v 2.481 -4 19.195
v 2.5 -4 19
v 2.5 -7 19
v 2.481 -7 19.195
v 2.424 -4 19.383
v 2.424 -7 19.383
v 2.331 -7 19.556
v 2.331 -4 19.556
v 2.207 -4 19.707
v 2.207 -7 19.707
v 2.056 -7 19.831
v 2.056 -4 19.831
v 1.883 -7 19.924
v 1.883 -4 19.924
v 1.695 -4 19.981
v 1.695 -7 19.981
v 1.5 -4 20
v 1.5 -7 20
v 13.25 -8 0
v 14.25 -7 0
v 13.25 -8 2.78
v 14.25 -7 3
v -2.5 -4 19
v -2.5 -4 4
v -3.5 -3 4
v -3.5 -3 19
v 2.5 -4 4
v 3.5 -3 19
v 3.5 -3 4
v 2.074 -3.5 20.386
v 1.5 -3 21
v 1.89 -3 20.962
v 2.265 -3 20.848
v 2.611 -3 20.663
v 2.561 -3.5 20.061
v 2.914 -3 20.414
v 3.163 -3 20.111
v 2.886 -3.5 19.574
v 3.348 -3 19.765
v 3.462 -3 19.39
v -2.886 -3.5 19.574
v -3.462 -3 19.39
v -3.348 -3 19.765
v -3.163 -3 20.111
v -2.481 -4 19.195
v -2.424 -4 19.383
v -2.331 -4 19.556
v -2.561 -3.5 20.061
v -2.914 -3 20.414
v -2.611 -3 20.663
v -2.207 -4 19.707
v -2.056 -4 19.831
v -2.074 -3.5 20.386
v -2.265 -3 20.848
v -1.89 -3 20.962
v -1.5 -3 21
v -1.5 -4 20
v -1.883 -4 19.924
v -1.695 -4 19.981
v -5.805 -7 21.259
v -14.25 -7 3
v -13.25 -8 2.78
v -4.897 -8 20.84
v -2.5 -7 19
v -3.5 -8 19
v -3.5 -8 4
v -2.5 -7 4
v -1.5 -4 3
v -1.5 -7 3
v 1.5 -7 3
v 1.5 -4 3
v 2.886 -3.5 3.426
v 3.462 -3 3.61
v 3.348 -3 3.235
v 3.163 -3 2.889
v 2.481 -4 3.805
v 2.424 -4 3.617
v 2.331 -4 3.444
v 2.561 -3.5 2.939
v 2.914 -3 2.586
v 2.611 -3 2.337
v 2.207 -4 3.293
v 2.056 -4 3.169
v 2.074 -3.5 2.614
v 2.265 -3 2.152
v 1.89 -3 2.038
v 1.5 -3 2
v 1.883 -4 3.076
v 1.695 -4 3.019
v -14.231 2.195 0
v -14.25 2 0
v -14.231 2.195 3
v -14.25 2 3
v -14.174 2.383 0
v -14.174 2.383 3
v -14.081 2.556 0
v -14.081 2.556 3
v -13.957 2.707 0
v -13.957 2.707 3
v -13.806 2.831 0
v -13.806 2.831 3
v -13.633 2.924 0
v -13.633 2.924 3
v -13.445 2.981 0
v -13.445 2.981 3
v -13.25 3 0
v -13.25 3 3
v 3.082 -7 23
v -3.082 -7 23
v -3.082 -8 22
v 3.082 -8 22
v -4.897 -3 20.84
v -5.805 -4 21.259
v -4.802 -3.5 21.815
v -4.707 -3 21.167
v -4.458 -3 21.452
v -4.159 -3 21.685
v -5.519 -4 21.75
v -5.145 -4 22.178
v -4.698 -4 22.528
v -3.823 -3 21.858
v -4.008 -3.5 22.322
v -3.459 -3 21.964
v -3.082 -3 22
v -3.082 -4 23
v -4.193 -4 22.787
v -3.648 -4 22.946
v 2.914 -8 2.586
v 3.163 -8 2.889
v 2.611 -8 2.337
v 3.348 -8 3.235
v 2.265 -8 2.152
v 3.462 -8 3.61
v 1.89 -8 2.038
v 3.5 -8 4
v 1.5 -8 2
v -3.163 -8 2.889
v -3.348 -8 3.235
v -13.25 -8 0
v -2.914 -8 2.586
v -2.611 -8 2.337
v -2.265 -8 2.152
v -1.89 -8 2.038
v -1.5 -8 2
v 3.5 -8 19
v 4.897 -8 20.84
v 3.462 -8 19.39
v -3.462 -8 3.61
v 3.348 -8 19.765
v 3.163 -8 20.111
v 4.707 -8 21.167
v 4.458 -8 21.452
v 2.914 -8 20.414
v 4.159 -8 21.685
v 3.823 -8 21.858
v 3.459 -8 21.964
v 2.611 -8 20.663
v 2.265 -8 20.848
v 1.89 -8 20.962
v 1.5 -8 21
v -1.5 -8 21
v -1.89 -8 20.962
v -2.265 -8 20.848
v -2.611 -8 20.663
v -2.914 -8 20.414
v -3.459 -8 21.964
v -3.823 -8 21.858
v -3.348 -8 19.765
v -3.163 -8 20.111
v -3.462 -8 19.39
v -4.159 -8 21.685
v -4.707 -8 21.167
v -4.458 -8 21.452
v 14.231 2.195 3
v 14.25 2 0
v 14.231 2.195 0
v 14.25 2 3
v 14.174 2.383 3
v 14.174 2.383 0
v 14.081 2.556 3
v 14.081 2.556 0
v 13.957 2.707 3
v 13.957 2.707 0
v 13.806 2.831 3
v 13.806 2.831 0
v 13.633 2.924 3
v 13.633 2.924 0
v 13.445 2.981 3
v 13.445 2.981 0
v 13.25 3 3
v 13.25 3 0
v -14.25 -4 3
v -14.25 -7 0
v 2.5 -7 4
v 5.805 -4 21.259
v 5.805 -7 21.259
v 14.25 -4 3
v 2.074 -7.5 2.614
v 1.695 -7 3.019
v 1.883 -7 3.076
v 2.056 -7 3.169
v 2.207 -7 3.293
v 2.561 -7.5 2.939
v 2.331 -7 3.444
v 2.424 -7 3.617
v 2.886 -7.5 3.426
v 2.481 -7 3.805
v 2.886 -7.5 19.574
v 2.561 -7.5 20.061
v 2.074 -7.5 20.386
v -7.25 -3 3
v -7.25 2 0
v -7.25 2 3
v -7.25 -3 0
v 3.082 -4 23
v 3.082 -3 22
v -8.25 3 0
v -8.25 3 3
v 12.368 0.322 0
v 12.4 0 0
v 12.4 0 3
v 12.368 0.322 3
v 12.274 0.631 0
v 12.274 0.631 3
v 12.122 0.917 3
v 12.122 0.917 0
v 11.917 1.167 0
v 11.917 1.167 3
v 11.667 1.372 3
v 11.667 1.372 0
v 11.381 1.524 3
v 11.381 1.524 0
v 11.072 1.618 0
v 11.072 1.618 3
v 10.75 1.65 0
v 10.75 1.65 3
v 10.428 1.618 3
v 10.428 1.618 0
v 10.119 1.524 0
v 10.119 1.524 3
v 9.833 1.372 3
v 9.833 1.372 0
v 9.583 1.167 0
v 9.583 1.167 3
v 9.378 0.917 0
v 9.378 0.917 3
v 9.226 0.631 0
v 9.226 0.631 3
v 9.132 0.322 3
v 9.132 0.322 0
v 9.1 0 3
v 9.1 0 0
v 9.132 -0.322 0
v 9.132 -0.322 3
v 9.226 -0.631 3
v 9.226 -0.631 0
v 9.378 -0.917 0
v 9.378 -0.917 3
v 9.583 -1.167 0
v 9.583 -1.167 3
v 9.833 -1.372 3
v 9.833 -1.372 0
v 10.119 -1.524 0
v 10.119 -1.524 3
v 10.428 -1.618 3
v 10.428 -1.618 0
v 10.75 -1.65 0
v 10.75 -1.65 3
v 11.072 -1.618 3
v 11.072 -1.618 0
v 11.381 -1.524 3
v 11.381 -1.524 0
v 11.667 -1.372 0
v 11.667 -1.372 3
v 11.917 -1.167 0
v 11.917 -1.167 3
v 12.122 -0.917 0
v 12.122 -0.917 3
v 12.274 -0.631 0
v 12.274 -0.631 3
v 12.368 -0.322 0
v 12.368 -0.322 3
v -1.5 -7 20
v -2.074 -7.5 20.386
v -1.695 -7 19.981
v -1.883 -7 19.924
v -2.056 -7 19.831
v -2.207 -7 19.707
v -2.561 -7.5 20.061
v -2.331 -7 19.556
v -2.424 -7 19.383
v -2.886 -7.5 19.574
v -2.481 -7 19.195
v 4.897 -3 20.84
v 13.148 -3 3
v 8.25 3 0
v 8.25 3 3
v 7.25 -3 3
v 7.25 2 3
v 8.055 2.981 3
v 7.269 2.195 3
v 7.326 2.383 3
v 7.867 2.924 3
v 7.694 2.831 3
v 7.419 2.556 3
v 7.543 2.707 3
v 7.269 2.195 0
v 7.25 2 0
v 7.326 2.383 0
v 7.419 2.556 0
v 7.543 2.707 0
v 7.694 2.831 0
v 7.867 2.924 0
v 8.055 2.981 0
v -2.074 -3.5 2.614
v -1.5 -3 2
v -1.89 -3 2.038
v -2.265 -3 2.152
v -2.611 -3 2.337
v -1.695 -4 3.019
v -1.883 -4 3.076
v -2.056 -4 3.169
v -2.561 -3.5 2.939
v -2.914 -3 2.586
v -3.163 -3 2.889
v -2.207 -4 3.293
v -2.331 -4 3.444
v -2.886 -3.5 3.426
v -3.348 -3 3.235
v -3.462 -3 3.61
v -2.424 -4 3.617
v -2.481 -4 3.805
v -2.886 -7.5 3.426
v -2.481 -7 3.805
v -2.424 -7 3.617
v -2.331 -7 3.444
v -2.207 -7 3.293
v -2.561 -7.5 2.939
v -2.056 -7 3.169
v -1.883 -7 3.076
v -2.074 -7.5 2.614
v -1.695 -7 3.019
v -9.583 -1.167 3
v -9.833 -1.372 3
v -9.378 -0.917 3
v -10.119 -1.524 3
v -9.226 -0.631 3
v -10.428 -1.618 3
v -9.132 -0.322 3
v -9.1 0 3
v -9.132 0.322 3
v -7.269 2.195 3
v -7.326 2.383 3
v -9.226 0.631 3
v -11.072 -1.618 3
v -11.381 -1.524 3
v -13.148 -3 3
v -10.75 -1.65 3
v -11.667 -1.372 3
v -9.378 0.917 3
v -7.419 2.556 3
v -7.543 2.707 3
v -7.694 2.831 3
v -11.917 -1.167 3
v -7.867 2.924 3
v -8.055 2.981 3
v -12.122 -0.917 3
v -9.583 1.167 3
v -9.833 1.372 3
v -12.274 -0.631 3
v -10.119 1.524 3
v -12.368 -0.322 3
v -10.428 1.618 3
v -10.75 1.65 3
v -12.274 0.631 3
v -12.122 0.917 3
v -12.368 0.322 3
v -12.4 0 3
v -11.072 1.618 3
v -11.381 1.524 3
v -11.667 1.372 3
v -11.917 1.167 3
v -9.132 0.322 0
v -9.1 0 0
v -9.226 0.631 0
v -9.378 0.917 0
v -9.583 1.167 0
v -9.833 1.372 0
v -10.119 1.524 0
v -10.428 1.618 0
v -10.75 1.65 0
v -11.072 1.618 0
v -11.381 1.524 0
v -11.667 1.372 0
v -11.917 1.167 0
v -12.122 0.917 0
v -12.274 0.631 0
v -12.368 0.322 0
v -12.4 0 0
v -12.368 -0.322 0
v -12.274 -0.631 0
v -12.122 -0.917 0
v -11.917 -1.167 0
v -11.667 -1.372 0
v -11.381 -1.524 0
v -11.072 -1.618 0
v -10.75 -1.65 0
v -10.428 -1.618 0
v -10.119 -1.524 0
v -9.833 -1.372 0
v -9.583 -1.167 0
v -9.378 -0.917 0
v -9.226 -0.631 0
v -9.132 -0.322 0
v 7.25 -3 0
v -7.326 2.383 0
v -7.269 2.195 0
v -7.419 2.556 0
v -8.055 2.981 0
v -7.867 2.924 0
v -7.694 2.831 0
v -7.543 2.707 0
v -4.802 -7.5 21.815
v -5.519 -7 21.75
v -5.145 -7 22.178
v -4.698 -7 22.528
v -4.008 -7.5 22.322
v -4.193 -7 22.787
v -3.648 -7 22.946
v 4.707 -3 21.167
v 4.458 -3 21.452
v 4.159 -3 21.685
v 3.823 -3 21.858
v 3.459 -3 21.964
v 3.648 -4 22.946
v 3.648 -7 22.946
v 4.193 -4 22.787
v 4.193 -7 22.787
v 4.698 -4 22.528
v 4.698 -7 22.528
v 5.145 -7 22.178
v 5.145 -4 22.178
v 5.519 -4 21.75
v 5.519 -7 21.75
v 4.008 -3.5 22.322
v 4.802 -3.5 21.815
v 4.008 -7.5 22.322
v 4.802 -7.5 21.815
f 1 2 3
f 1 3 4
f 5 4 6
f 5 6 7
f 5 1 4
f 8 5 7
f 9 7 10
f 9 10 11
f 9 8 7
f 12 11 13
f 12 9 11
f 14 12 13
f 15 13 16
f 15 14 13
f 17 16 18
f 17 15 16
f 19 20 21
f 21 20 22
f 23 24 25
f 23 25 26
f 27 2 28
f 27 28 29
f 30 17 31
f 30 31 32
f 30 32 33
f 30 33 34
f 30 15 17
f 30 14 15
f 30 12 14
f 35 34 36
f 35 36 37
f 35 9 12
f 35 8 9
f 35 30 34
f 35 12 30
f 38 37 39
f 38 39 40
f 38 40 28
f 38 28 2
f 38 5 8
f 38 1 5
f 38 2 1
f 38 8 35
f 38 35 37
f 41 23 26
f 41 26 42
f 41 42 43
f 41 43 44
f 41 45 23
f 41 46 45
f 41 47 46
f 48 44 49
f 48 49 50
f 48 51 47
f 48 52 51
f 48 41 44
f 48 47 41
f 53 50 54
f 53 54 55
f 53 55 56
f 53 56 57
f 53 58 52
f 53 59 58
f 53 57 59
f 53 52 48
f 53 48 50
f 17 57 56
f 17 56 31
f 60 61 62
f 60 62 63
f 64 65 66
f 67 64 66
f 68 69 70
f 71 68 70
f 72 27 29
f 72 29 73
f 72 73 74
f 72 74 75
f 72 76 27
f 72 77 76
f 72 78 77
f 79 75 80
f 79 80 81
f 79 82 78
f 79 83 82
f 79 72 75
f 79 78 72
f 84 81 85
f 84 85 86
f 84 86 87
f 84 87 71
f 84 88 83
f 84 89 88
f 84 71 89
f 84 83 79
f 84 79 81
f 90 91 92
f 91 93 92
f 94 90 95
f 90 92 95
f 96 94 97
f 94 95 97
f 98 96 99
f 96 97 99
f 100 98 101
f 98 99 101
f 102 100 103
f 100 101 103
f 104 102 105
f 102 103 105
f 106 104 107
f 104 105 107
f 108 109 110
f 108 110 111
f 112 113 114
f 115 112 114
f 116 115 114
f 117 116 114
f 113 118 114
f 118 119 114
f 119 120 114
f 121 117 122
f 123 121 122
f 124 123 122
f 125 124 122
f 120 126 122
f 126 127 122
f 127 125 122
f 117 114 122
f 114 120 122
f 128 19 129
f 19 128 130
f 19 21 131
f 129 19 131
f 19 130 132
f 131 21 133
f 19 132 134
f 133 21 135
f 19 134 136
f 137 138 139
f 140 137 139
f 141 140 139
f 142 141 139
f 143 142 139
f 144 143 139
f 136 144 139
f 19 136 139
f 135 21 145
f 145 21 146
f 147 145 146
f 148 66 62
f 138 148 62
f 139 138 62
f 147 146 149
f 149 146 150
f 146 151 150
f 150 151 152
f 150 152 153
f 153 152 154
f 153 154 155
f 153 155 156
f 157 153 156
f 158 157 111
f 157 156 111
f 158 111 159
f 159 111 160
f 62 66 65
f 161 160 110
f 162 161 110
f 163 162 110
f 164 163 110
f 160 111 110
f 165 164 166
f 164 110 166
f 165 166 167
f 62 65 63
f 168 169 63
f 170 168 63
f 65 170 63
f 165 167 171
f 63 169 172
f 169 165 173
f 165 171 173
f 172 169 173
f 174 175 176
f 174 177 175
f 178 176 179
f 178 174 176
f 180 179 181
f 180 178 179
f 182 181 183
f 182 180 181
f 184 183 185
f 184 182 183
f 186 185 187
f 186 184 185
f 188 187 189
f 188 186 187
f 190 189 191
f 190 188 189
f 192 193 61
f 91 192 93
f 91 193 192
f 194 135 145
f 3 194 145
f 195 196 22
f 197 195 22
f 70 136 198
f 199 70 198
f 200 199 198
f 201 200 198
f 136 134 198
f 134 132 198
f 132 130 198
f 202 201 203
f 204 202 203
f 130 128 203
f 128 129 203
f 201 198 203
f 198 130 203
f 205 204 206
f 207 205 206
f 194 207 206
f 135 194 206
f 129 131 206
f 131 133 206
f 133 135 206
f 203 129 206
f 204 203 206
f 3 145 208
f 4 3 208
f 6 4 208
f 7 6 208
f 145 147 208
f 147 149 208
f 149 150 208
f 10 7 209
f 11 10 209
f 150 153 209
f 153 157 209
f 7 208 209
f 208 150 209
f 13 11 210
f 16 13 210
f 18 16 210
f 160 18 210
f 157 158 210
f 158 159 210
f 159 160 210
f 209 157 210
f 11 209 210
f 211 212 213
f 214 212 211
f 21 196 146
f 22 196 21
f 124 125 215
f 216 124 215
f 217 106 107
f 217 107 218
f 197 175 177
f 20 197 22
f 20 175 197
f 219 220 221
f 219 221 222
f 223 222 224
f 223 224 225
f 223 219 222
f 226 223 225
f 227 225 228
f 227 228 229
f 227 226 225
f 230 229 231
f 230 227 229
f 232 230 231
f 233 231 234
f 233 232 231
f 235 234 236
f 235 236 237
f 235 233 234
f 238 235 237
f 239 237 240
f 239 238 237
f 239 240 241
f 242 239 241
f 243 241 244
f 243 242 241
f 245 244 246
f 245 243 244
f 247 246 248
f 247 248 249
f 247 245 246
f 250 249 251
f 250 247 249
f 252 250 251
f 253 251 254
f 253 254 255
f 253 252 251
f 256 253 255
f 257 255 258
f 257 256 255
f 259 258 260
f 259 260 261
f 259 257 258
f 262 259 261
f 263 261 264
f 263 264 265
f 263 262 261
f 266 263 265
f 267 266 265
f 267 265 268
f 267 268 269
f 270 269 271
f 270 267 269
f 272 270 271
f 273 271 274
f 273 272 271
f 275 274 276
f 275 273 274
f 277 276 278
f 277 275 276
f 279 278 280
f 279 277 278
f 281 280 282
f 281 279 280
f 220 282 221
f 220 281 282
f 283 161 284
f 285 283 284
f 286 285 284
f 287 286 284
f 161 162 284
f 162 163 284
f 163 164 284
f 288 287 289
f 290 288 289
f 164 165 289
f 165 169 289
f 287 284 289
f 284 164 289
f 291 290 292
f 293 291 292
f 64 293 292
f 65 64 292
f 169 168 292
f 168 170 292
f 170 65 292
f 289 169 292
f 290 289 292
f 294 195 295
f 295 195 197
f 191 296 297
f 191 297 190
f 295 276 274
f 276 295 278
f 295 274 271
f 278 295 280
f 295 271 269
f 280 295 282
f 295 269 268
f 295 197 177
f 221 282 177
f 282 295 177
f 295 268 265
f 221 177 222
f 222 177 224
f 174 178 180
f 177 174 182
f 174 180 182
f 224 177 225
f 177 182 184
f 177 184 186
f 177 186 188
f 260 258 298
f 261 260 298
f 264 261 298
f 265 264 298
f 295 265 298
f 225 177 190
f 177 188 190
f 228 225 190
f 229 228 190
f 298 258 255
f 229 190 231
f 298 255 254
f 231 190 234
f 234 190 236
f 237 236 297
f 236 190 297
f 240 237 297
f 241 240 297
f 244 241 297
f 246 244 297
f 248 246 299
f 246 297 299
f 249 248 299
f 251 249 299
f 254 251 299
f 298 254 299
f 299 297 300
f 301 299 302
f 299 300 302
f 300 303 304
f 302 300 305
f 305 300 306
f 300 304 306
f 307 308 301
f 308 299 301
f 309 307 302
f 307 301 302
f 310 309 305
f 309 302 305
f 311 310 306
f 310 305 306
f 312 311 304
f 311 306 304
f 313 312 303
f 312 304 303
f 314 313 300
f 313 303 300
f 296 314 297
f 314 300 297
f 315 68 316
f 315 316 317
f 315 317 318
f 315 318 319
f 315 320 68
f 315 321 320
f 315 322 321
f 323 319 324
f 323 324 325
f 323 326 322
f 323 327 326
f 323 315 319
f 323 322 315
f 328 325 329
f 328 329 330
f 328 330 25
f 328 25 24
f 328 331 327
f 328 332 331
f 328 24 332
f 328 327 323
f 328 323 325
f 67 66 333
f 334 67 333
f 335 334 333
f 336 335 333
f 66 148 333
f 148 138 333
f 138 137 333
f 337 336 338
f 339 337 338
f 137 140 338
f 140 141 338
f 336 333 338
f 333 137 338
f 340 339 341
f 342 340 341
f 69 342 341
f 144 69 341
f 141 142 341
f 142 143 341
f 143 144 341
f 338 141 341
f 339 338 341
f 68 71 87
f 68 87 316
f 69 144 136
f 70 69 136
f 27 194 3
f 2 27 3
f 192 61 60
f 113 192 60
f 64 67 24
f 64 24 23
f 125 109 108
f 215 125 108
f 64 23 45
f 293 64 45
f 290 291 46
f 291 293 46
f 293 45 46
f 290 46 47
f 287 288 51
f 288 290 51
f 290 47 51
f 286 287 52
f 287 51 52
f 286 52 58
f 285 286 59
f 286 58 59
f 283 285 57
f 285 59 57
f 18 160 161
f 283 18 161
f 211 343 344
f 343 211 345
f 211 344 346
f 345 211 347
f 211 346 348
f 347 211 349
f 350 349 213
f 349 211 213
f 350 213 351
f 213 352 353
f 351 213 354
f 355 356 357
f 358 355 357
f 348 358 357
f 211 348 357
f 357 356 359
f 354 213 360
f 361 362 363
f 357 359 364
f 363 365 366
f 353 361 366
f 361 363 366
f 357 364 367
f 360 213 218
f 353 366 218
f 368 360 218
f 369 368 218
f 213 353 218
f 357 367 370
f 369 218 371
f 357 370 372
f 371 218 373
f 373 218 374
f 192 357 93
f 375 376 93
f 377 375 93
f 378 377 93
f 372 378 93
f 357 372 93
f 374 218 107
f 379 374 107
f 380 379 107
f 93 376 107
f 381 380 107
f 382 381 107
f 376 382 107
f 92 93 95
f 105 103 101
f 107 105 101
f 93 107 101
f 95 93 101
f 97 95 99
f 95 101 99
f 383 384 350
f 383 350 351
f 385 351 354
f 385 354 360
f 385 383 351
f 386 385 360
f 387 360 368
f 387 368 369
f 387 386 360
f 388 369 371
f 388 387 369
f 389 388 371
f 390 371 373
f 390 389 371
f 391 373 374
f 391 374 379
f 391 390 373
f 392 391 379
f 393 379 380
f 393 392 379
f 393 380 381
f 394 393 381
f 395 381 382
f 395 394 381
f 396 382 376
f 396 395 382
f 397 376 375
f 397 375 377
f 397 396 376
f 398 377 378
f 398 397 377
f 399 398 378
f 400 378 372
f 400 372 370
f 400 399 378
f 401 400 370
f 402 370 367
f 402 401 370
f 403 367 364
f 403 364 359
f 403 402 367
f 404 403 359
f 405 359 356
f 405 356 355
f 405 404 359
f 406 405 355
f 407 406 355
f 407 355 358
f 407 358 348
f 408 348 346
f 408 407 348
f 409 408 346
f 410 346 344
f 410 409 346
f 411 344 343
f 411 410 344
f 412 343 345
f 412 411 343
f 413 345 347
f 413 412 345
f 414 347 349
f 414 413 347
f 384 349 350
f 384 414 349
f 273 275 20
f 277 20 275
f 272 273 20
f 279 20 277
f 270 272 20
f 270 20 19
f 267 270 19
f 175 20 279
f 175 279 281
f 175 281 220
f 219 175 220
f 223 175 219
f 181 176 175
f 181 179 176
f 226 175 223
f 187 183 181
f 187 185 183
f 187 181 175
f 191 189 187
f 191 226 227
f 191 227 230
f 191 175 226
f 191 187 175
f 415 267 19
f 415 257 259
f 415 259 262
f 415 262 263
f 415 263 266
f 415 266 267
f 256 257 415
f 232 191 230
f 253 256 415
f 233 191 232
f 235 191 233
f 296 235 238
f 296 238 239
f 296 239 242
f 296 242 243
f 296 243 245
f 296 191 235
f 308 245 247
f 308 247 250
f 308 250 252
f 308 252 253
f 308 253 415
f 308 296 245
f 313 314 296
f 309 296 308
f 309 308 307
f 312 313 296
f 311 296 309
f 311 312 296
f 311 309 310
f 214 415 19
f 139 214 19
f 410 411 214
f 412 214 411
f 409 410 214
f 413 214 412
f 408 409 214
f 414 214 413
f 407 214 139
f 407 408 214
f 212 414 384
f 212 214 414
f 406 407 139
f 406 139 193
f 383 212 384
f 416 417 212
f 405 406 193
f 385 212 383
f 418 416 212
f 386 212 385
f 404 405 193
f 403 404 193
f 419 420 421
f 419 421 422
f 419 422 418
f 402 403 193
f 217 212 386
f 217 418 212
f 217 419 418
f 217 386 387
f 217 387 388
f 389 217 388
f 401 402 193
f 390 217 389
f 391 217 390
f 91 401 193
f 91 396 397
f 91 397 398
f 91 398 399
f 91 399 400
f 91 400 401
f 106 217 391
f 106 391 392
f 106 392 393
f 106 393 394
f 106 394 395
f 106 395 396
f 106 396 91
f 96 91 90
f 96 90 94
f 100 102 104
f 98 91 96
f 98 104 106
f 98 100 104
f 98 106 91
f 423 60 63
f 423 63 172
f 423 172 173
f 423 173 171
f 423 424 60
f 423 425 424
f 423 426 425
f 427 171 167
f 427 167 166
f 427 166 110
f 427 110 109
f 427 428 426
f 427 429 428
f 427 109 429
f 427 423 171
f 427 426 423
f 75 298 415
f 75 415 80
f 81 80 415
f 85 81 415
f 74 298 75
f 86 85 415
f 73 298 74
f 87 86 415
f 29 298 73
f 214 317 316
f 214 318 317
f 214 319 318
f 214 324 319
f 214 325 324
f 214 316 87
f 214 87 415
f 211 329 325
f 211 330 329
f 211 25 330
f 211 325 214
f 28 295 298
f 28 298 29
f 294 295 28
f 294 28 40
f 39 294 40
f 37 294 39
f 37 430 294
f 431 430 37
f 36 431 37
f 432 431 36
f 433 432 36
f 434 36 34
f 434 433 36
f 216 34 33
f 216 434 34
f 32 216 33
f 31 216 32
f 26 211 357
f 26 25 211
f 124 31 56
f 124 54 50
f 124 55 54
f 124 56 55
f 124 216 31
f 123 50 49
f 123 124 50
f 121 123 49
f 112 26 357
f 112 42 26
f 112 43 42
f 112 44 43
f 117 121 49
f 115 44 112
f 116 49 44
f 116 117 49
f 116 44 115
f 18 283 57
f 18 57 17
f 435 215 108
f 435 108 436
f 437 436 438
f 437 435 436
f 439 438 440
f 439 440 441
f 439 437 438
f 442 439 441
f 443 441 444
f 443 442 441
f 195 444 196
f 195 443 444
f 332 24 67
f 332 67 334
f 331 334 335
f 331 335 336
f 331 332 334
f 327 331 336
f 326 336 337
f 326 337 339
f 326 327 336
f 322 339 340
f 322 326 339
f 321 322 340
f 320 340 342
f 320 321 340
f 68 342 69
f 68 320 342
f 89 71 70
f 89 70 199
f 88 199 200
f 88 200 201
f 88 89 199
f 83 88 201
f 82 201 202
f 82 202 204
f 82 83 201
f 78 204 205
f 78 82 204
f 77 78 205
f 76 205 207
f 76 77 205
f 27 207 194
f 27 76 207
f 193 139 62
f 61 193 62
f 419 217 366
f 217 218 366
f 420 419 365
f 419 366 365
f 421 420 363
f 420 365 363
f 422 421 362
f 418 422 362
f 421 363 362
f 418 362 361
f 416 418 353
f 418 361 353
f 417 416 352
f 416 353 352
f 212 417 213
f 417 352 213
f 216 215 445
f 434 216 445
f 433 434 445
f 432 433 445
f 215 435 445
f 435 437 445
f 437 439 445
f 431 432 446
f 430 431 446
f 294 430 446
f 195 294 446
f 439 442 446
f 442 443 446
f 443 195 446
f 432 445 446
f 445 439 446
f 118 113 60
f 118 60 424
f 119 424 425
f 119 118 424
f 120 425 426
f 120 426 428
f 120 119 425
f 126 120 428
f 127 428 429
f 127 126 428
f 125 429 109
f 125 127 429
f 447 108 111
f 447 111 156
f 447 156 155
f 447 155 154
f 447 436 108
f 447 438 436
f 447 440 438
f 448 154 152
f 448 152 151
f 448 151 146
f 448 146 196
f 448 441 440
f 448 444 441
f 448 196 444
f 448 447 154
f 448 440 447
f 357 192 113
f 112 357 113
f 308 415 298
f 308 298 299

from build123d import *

# Parameters (mm, degrees)
SKETCH_1_R          = 1.65
EXTRUDE_1_DEPTH     = 3
EXTRUDE_2_DEPTH     = 5
SKETCH_3_W          = 5
SKETCH_3_H          = 17
CUT_EXTRUDE_1_DEPTH = 12
FILLET_1_R          = 3
FILLET_2_R          = 1
CHAMFER_1_SIZE      = 1
FILLET_3_R          = 1
CHAMFER_2_SIZE      = 1


with BuildPart() as part:
    # ｽｹｯﾁ1 → ﾎﾞｽ - 押し出し1 (new body)
    with BuildSketch(Plane.XY):
        Polygon((-7.25, -3), (7.25, -3), (7.25, 3), (14.25, 3), (14.25, -8), (-14.25, -8), (-14.25, 3), (-7.25, 3), align=None)
        with Locations((10.75, 0)):
            Circle(SKETCH_1_R, mode=Mode.SUBTRACT)
        with Locations((-10.75, 0)):
            Circle(SKETCH_1_R, mode=Mode.SUBTRACT)
    extrude(amount=EXTRUDE_1_DEPTH)

    # ｽｹｯﾁ2 → ﾎﾞｽ - 押し出し2 (add)
    with BuildSketch(Plane.XZ.offset(8)):
        Polygon((-14.25, 3), (-5, 23), (5, 23), (14.25, 3), align=None)
    extrude(amount=-EXTRUDE_2_DEPTH)

    # ｽｹｯﾁ3 → ｶｯﾄ - 押し出し1 (cut, through all)
    with BuildSketch(Plane.XZ.offset(8)):
        with Locations((0, 11.5)):
            Rectangle(SKETCH_3_W, SKETCH_3_H)
    extrude(amount=-CUT_EXTRUDE_1_DEPTH, mode=Mode.SUBTRACT)

    # ﾌｨﾚｯﾄ1
    fillet_1_edges = [part.edges().sort_by_distance(p)[0] for p in [
        (-5, -5.5, 23),
        (5, -5.5, 23),
    ]]
    fillet(fillet_1_edges, radius=FILLET_1_R)

    # ﾌｨﾚｯﾄ2
    fillet_2_edges = [part.edges().sort_by_distance(p)[0] for p in [
        (7.25, 3, 1.5),
        (14.25, 3, 1.5),
        (-14.25, 3, 1.5),
        (-7.25, 3, 1.5),
    ]]
    fillet(fillet_2_edges, radius=FILLET_2_R)

    # 面取り1
    chamfer_1_edges = [part.edges().sort_by_distance(p)[0] for p in [
        (14.25, -8, 1.5),
        (-14.25, -8, 1.5),
        (10.027529355, -3, 12.12966626),
        (10.027529355, -8, 12.12966626),
        (0, -8, 23),
        (0, -3, 23),
        (-10.027529355, -8, 12.12966626),
        (4.69803687, -8, 22.527646886),
        (-4.69803687, -8, 22.527646886),
        (-10.027529355, -3, 12.12966626),
        (4.69803687, -3, 22.527646886),
        (-4.69803687, -3, 22.527646886),
    ]]
    chamfer(chamfer_1_edges, length=CHAMFER_1_SIZE)

    # ﾌｨﾚｯﾄ3
    fillet_3_edges = [part.edges().sort_by_distance(p)[0] for p in [
        (2.5, -5.5, 20),
        (2.5, -5.5, 3),
        (-2.5, -5.5, 3),
        (-2.5, -5.5, 20),
    ]]
    fillet(fillet_3_edges, radius=FILLET_3_R)

    # 面取り2
    chamfer_2_edges = [part.edges().sort_by_distance(p)[0] for p in [
        (2.5, -8, 11.5),
        (2.5, -3, 11.5),
        (0, -8, 3),
        (0, -3, 3),
        (-2.5, -8, 11.5),
        (-2.5, -3, 11.5),
        (0, -8, 20),
        (0, -3, 20),
        (2.207106781, -8, 3.292893219),
        (2.207106781, -3, 3.292893219),
        (-2.207106781, -8, 3.292893219),
        (-2.207106781, -3, 3.292893219),
        (2.207106781, -8, 19.707106781),
        (2.207106781, -3, 19.707106781),
        (-2.207106781, -8, 19.707106781),
        (-2.207106781, -3, 19.707106781),
    ]]
    chamfer(chamfer_2_edges, length=CHAMFER_2_SIZE)


solid = part.part
